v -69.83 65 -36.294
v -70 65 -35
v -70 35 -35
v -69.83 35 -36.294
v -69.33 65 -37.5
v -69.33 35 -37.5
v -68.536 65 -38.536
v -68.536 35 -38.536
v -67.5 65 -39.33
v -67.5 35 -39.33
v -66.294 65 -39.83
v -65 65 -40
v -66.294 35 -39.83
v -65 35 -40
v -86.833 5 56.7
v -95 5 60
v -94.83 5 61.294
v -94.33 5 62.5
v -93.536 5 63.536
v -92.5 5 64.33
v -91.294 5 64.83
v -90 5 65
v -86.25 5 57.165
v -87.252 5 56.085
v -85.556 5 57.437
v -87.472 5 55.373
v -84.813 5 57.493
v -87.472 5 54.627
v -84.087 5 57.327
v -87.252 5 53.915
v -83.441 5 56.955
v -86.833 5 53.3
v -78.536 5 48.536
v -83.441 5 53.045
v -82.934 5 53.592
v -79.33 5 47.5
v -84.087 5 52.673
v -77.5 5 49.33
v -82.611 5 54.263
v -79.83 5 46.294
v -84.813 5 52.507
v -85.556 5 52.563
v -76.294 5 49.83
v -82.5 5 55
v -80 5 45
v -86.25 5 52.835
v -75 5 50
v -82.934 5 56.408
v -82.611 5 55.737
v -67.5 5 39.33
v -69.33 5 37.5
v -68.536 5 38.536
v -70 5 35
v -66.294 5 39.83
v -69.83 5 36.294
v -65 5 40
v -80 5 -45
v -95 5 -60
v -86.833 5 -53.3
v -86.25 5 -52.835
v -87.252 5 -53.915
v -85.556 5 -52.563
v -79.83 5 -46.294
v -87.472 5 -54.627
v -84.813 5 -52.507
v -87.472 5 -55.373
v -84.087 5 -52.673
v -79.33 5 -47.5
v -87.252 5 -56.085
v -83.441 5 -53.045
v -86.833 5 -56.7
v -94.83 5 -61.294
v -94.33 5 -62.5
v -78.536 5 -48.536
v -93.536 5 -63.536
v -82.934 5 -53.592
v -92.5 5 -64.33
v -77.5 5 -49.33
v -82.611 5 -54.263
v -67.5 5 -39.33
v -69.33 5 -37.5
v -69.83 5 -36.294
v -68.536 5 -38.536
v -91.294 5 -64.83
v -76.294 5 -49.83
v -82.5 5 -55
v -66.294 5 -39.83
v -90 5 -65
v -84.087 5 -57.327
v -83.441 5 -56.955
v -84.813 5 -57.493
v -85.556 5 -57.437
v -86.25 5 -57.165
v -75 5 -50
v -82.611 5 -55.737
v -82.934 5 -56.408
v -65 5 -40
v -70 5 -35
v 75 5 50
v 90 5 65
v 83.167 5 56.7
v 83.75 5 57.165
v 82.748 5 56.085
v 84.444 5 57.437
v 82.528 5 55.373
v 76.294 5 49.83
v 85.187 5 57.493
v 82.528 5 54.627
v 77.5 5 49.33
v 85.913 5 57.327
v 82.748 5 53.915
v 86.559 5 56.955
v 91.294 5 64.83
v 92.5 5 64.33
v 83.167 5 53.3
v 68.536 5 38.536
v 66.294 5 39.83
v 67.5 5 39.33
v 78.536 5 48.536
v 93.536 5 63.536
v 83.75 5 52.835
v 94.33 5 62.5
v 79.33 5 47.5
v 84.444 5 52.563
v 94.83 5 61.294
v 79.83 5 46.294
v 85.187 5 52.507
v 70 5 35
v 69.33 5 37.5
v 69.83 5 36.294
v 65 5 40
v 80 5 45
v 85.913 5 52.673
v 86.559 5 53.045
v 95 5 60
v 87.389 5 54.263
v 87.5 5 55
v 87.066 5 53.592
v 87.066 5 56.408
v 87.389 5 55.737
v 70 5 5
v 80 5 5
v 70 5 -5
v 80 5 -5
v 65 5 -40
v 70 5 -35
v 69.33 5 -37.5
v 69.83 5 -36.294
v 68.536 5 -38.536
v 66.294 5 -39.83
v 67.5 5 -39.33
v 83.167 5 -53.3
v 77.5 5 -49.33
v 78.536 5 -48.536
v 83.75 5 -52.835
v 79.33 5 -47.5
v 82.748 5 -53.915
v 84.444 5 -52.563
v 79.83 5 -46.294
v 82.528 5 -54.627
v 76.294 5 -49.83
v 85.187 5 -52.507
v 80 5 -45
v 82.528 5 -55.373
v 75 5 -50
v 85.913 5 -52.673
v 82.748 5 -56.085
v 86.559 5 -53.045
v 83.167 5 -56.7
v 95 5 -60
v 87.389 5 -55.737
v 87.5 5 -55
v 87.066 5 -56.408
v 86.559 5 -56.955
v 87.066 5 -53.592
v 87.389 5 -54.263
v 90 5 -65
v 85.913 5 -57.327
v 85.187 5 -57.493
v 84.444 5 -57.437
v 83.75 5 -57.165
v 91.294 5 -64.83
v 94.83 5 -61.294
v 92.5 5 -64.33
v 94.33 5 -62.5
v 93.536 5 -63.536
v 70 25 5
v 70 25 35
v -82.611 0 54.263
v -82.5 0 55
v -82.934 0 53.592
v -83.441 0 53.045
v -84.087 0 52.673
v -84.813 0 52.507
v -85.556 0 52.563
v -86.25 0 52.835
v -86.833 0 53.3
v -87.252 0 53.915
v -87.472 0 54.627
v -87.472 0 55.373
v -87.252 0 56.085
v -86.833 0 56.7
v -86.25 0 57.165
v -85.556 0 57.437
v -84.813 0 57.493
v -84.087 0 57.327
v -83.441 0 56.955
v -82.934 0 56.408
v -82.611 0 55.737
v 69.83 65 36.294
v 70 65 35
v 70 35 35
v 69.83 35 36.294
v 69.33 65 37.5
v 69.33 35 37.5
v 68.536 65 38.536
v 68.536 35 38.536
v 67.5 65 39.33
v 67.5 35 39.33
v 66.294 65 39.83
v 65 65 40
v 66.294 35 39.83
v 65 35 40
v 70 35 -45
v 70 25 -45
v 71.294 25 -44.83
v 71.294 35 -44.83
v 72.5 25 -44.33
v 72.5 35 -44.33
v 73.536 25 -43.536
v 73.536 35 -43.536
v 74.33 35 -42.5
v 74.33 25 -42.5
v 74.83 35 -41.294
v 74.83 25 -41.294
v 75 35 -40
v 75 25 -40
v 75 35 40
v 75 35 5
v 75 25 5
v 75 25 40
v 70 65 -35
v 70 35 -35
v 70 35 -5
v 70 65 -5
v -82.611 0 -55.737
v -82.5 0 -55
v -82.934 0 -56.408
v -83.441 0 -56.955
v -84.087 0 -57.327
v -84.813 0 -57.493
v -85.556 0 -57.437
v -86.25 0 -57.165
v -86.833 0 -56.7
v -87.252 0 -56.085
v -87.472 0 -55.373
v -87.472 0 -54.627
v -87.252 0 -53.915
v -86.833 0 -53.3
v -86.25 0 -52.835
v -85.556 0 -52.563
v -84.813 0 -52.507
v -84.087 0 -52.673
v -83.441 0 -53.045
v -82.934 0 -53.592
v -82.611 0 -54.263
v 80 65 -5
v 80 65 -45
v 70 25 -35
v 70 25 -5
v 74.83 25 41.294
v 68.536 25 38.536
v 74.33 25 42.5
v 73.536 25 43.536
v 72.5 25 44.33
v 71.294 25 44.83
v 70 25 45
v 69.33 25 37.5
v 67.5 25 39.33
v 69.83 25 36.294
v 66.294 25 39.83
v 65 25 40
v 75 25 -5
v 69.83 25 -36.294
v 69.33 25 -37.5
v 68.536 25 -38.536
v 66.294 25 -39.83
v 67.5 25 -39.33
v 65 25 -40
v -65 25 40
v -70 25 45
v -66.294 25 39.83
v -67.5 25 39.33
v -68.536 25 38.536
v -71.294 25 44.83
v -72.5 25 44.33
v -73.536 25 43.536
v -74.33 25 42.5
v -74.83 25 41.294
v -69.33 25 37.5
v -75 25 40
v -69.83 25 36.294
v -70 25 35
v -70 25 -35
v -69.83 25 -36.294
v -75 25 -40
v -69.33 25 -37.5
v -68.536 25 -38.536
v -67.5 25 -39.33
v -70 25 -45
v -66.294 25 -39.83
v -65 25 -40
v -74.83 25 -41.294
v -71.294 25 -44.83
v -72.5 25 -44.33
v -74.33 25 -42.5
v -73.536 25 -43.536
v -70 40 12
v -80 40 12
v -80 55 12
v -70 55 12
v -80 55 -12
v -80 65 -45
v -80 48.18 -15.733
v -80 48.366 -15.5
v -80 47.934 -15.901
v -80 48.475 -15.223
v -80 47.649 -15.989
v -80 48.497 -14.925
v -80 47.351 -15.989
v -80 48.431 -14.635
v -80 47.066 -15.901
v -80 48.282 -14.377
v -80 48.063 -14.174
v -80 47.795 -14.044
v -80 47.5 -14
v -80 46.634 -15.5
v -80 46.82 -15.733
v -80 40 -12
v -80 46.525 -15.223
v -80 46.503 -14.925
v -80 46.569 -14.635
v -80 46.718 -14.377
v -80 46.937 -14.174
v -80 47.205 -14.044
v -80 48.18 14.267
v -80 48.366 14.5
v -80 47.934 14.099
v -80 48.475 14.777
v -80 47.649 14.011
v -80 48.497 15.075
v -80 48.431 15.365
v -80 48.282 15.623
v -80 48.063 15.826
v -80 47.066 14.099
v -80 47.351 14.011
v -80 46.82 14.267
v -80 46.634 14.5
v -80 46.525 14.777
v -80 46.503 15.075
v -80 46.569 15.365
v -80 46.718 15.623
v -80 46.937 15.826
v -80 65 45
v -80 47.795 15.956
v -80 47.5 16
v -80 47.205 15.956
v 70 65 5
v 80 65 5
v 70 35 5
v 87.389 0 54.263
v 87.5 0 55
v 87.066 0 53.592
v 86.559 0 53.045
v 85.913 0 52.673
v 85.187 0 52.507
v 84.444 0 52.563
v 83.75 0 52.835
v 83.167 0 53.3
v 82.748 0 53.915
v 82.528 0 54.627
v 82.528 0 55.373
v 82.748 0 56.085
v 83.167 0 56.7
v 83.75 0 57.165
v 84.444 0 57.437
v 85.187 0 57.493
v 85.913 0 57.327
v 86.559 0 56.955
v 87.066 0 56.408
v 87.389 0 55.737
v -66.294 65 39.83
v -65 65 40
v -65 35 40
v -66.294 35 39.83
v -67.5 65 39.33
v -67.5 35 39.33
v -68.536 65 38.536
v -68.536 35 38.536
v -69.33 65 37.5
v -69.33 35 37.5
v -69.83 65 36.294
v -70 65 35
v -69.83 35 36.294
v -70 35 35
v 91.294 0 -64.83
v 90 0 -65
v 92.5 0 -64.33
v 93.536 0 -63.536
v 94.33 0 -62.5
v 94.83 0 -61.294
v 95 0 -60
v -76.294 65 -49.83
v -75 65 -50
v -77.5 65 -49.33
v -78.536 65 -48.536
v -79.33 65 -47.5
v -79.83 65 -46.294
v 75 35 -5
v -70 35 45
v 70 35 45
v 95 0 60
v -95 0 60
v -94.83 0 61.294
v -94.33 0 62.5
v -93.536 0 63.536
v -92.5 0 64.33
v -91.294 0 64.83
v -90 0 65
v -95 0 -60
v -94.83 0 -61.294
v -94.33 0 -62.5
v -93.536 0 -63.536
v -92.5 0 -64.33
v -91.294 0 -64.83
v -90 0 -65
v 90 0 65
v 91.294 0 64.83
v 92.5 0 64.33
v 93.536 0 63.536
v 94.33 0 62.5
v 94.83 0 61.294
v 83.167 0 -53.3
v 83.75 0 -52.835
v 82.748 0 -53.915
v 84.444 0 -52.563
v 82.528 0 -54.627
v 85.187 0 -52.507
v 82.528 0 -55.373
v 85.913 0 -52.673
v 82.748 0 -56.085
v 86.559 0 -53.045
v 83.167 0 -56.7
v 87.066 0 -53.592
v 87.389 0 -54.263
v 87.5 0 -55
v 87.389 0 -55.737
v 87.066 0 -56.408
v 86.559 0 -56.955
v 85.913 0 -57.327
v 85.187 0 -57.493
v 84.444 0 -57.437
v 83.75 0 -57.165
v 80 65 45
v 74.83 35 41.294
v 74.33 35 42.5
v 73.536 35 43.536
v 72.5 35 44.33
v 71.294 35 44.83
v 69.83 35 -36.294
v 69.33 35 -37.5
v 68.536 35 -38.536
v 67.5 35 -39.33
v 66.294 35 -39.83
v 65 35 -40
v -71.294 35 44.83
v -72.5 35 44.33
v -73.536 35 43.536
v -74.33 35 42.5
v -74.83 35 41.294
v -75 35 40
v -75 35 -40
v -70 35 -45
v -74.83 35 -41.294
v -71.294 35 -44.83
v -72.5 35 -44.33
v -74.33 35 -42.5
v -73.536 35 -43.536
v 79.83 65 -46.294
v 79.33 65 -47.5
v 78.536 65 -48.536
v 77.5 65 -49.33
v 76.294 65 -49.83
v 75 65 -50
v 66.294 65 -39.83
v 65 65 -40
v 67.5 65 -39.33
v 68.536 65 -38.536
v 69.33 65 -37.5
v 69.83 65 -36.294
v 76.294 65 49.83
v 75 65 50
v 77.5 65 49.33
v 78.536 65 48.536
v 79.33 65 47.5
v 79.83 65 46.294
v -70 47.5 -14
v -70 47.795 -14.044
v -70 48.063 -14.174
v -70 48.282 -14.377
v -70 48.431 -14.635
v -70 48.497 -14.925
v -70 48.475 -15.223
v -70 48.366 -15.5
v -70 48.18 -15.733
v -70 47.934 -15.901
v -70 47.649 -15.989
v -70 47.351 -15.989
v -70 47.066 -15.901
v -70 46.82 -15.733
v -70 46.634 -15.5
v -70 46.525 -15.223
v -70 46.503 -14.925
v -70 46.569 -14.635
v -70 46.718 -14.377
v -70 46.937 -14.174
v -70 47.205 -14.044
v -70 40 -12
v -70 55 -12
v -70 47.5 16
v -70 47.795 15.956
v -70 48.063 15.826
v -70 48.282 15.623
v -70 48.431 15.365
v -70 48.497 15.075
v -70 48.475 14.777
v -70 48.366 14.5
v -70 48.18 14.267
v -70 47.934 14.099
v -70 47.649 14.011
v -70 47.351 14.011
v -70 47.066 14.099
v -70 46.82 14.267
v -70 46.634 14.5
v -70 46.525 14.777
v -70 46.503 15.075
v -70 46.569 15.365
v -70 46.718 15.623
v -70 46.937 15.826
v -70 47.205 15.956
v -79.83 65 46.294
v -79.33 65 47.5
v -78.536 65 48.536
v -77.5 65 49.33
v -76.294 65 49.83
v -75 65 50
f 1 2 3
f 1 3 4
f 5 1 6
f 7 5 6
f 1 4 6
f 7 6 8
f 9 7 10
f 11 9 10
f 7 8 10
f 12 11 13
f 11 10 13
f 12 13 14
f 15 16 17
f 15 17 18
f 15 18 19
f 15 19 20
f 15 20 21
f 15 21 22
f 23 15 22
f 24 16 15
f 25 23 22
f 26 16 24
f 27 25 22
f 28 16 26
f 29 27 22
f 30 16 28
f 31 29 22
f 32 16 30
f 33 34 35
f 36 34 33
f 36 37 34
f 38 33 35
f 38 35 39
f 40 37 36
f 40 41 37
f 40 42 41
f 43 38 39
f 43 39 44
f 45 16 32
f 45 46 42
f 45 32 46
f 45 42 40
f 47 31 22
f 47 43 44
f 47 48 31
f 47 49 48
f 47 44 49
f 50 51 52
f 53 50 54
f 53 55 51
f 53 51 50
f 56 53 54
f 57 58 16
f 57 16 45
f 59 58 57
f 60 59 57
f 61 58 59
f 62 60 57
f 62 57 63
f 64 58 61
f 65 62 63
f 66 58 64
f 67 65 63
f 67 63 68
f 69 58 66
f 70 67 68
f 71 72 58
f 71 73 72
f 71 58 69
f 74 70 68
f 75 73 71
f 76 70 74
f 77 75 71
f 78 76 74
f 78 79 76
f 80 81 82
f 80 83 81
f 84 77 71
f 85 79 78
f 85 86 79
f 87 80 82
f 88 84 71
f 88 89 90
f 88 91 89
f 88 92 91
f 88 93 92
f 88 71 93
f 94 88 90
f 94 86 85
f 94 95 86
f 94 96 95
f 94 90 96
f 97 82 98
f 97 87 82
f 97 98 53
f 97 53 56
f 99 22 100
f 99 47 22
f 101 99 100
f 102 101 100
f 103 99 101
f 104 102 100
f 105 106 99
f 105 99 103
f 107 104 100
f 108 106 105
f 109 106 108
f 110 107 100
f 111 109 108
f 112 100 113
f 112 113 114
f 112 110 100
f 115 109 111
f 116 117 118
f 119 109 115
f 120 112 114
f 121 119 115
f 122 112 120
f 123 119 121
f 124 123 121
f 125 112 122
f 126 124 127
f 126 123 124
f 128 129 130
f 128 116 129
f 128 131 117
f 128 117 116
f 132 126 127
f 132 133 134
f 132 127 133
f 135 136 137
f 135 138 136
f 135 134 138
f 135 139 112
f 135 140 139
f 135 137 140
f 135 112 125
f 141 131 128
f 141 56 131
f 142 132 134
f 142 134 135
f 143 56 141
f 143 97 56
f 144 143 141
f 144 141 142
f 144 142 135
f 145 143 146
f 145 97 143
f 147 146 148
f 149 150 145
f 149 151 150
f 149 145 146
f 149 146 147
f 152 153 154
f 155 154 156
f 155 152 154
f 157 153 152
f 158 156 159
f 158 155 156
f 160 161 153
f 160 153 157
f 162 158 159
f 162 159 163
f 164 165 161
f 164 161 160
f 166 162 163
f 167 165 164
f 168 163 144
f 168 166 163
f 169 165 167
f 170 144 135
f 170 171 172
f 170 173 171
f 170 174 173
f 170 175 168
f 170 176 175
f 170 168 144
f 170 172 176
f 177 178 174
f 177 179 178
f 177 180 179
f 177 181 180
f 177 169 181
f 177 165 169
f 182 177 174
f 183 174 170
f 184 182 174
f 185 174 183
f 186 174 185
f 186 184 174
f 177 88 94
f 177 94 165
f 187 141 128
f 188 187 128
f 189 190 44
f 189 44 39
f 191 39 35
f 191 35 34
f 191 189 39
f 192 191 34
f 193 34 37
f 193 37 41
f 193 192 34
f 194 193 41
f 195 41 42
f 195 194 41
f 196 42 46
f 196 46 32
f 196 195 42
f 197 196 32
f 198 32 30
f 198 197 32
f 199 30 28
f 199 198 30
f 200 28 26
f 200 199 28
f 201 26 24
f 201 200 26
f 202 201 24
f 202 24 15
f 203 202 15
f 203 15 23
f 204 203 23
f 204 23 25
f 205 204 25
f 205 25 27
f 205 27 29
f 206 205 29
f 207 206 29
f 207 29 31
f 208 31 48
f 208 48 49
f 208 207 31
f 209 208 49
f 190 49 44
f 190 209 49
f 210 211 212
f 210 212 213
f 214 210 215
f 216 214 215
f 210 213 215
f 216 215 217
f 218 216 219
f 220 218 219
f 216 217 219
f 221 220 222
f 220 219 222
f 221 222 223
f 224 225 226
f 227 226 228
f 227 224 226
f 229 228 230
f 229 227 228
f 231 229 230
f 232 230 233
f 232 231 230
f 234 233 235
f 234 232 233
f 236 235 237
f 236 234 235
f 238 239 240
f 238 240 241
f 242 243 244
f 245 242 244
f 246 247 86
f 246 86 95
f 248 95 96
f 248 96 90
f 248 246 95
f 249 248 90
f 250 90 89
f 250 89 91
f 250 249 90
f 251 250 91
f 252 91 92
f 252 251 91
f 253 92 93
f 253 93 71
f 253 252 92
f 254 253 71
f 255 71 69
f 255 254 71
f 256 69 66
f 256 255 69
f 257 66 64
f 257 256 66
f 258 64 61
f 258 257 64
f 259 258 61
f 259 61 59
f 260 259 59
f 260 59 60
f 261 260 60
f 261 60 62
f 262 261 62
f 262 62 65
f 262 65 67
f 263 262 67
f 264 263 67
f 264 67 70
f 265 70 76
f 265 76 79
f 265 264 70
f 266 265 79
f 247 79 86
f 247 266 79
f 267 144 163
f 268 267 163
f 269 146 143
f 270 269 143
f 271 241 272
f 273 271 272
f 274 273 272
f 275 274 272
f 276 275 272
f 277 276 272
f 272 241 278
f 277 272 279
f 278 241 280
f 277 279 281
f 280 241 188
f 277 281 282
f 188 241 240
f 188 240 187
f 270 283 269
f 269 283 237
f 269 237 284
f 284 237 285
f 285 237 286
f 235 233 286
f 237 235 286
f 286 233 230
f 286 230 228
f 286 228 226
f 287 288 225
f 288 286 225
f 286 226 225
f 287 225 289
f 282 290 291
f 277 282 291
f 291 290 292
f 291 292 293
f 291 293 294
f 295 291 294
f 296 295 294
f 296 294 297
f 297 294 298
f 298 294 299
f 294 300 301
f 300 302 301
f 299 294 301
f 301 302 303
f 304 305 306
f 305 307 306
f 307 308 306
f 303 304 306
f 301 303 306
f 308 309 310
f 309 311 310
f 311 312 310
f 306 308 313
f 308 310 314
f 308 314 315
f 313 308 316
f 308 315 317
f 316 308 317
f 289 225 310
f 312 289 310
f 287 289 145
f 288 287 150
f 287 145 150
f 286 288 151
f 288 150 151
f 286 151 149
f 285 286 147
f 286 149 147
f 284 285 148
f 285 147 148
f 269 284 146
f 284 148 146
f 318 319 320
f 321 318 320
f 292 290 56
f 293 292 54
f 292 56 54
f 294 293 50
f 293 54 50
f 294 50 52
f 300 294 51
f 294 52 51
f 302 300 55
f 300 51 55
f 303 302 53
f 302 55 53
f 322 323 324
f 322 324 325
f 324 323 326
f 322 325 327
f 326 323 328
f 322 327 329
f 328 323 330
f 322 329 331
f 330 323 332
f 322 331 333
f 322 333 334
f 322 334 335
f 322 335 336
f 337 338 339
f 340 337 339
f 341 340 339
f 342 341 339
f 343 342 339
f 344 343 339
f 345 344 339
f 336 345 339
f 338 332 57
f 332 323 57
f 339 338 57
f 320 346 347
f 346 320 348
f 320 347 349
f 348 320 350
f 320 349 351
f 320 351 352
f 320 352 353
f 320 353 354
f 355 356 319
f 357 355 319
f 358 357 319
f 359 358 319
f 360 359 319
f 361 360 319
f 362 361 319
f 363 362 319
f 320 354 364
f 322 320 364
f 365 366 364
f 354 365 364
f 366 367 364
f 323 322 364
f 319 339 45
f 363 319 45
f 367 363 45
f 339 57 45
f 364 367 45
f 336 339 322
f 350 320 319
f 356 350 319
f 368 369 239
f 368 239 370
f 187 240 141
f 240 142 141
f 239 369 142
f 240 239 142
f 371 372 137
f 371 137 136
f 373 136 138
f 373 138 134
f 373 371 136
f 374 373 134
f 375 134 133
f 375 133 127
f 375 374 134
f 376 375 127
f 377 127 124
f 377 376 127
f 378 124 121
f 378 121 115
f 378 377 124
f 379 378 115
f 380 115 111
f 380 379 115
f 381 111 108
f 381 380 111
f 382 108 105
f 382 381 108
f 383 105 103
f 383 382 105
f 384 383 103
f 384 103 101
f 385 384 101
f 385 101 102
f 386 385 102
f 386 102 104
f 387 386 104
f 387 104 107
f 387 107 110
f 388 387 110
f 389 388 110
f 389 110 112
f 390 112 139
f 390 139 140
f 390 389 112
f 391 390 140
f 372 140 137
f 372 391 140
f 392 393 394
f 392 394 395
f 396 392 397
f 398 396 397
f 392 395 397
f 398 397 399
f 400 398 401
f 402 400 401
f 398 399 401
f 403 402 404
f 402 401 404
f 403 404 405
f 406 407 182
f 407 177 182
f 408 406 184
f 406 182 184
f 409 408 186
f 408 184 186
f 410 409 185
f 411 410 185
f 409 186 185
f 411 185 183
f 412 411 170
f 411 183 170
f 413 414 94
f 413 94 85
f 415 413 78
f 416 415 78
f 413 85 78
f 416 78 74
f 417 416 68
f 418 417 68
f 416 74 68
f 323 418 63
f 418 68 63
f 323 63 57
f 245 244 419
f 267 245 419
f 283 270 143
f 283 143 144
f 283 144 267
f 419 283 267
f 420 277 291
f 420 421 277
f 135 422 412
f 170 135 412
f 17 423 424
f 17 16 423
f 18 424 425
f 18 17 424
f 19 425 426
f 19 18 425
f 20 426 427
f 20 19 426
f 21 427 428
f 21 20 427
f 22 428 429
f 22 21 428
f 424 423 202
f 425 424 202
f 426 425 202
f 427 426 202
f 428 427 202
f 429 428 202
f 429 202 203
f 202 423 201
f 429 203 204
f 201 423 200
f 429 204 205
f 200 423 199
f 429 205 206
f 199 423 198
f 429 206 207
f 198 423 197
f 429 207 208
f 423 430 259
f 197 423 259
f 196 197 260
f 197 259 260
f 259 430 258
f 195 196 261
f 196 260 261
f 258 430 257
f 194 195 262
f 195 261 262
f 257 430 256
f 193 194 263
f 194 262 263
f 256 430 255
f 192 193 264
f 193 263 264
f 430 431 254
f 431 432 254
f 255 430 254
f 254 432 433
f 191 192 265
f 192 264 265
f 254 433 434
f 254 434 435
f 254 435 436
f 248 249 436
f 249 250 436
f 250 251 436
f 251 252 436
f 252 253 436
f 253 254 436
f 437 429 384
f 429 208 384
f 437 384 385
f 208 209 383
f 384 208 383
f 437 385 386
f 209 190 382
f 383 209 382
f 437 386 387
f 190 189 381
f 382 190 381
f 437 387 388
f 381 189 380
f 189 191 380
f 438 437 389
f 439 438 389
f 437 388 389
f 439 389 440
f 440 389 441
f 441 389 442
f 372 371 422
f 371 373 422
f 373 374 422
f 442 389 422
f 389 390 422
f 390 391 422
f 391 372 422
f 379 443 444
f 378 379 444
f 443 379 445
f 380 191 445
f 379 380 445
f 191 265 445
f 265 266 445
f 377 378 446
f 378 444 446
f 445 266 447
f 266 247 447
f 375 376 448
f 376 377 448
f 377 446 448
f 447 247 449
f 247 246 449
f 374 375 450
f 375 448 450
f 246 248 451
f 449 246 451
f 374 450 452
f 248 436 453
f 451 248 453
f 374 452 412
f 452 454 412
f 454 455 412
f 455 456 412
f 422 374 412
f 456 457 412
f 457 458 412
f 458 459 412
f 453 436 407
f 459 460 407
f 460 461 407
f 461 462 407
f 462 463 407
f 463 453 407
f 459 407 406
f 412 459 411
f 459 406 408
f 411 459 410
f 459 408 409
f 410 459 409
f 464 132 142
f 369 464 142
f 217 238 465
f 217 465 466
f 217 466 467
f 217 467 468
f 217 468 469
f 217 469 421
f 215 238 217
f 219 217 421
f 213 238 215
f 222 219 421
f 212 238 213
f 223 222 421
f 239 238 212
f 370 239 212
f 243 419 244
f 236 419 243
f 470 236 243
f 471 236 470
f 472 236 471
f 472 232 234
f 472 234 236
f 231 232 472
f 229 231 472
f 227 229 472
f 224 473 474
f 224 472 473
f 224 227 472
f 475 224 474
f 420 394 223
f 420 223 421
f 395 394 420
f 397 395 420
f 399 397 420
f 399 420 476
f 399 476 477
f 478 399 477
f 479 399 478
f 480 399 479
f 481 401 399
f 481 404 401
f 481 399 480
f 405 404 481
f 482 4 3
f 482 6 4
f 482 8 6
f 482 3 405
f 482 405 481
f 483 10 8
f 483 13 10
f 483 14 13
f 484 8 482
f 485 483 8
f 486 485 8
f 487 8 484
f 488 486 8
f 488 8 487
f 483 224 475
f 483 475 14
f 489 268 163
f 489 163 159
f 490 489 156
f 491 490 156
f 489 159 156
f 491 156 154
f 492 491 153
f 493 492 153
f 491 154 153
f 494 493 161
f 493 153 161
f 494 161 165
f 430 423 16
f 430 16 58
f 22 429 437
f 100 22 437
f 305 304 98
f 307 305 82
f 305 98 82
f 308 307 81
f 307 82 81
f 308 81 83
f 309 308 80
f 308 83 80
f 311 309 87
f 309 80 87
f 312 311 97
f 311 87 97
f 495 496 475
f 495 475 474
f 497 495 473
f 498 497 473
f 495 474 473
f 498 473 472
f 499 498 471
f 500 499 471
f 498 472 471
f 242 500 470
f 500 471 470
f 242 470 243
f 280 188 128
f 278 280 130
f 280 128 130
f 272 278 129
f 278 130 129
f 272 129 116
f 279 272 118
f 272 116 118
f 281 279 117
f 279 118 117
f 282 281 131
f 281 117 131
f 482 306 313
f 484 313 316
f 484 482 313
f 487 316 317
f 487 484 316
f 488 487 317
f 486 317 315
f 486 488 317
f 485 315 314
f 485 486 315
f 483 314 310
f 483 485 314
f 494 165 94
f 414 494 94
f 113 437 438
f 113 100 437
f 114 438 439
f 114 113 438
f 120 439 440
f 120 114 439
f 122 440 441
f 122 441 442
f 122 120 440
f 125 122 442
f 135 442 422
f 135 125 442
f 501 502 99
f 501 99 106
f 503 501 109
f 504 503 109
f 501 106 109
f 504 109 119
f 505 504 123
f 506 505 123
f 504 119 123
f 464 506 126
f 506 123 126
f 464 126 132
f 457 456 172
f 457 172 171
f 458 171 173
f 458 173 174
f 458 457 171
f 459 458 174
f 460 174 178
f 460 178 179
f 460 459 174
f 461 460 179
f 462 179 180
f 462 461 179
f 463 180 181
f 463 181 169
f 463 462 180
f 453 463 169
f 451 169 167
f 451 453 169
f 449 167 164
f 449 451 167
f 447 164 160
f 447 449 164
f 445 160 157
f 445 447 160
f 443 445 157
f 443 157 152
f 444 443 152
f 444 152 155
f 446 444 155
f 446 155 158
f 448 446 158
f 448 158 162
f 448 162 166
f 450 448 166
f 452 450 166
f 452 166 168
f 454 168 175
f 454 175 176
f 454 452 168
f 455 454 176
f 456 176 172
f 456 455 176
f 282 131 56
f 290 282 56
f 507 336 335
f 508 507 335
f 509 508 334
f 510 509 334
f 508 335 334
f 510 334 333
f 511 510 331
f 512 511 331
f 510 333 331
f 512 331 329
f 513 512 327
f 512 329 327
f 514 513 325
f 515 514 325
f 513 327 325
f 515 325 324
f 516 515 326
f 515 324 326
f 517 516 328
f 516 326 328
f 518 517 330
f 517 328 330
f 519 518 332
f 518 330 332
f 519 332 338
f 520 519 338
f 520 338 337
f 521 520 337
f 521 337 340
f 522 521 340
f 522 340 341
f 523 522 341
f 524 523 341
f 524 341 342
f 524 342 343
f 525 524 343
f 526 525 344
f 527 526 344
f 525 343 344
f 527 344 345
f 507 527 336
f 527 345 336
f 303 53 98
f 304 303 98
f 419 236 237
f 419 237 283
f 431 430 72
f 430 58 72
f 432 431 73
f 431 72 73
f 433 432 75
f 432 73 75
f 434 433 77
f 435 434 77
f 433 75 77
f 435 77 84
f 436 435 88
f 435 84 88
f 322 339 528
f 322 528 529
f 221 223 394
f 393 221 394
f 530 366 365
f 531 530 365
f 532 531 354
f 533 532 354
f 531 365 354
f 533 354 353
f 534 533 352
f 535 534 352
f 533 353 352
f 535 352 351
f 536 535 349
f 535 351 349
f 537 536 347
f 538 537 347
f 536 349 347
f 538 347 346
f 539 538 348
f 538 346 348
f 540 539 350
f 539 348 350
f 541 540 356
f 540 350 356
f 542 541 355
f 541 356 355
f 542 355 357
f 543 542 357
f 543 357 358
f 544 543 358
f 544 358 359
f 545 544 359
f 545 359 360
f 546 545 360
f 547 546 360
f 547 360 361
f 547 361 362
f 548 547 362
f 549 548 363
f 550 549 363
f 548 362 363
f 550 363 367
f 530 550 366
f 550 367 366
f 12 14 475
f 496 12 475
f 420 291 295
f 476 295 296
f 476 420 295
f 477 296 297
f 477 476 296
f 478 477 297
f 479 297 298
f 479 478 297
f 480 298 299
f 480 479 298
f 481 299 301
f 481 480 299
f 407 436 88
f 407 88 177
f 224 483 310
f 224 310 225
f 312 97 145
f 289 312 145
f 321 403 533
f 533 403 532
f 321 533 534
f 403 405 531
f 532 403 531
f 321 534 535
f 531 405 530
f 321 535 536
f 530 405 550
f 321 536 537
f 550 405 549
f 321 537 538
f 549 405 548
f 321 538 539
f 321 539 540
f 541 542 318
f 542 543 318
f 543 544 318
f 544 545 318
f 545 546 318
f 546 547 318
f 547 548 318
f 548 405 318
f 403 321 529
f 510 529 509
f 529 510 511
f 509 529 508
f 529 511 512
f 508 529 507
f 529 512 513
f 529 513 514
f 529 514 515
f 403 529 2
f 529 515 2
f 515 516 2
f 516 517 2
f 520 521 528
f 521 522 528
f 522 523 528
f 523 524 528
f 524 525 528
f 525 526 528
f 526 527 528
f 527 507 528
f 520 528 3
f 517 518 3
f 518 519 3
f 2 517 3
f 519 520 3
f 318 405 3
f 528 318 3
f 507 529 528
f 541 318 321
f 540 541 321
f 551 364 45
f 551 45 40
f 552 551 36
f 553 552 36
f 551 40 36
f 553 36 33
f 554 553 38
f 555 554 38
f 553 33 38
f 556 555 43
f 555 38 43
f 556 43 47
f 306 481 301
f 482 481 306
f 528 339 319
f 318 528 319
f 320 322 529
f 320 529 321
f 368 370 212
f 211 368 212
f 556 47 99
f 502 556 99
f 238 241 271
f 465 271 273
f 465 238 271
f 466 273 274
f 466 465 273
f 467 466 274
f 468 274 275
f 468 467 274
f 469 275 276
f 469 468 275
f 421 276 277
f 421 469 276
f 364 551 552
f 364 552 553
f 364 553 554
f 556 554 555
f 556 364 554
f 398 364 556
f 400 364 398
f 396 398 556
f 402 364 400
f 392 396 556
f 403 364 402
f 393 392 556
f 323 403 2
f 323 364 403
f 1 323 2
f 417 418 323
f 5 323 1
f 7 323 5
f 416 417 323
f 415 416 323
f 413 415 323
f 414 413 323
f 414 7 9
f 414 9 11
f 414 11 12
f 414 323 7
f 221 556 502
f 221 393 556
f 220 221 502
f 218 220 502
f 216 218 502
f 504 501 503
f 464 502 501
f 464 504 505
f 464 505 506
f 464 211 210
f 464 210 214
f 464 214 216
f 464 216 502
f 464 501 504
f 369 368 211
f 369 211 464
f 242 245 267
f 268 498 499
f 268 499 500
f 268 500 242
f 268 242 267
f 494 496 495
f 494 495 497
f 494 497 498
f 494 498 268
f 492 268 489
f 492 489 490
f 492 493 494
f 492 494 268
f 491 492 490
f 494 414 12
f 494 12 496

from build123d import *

# Parameters (mm, degrees)
SKETCH_1_W          = 190
SKETCH_1_H          = 130
SKETCH_1_R          = 2.5
EXTRUDE_1_DEPTH     = 5
FILLET_1_R          = 5
EXTRUDE_2_DEPTH     = 60
SKETCH_3_R          = 1
SKETCH_3_W          = 24
SKETCH_3_H          = 15
CUT_EXTRUDE_1_DEPTH = 10
CUT_EXTRUDE_2_DEPTH = 5


with BuildPart() as part:
    # 草圖1 → 填料-伸長1 (new body)
    with BuildSketch(Plane(origin=(0, 0, 0), x_dir=(1, 0, 0), z_dir=(0, 1, 0))):
        Rectangle(SKETCH_1_W, SKETCH_1_H)
        with Locations((-85, 55)):
            Circle(SKETCH_1_R, mode=Mode.SUBTRACT)
        with Locations((85, 55)):
            Circle(SKETCH_1_R, mode=Mode.SUBTRACT)
        with Locations((-85, -55)):
            Circle(SKETCH_1_R, mode=Mode.SUBTRACT)
        with Locations((85, -55)):
            Circle(SKETCH_1_R, mode=Mode.SUBTRACT)
    extrude(amount=EXTRUDE_1_DEPTH)

    # 圓角1
    fillet_1_edges = [part.edges().sort_by_distance(p)[0] for p in [
        (95, 2.5, 65),
        (-95, 2.5, 65),
        (-95, 2.5, -65),
        (95, 2.5, -65),
    ]]
    fillet(fillet_1_edges, radius=FILLET_1_R)

    # 草圖2 → 填料-伸長2 (add)
    with BuildSketch(Plane(origin=(0, 5, 0), x_dir=(1, 0, 0), z_dir=(0, 1, 0))):
        with BuildLine():
            Line((-80, 45), (-80, -45))
            ThreePointArc((-80, -45), (-78.535533906, -48.535533906), (-75, -50))
            Line((-75, -50), (75, -50))
            ThreePointArc((75, -50), (78.535533906, -48.535533906), (80, -45))
            Line((80, -45), (80, -5))
            Line((80, -5), (70, -5))
            Line((70, -5), (70, -35))
            ThreePointArc((70, -35), (68.535533906, -38.535533906), (65, -40))
            Line((65, -40), (-65, -40))
            ThreePointArc((-65, -40), (-68.535533906, -38.535533906), (-70, -35))
            Line((-70, -35), (-70, 35))
            ThreePointArc((-70, 35), (-68.535533906, 38.535533906), (-65, 40))
            Line((-65, 40), (65, 40))
            ThreePointArc((65, 40), (68.535533906, 38.535533906), (70, 35))
            Line((70, 35), (70, 5))
            Line((70, 5), (80, 5))
            Line((80, 5), (80, 45))
            ThreePointArc((80, 45), (78.535533906, 48.535533906), (75, 50))
            Line((75, 50), (-75, 50))
            ThreePointArc((-75, 50), (-78.535533906, 48.535533906), (-80, 45))
        make_face()
    extrude(amount=EXTRUDE_2_DEPTH)

    # 草圖3 → 除料-伸長1 (cut)
    with BuildSketch(Plane.ZY.offset(80)):
        with Locations((15, 47.5)):
            Circle(SKETCH_3_R)
        with Locations((-15, 47.5)):
            Circle(SKETCH_3_R)
        with Locations((0, 47.5)):
            Rectangle(SKETCH_3_W, SKETCH_3_H)
    extrude(amount=-CUT_EXTRUDE_1_DEPTH, mode=Mode.SUBTRACT)

    # 草圖4 → 除料-伸長2 (cut, symmetric)
    with BuildSketch(Plane(origin=(0, 30, 0), x_dir=(1, 0, 0), z_dir=(0, 1, 0))):
        with BuildLine():
            Line((-70, 45), (70, 45))
            ThreePointArc((70, 45), (73.535533906, 43.535533906), (75, 40))
            Line((75, 40), (75, -40))
            ThreePointArc((75, -40), (73.535533906, -43.535533906), (70, -45))
            Line((70, -45), (-70, -45))
            ThreePointArc((-70, -45), (-73.535533906, -43.535533906), (-75, -40))
            Line((-75, -40), (-75, 40))
            ThreePointArc((-75, 40), (-73.535533906, 43.535533906), (-70, 45))
        make_face()
        with BuildLine():
            Line((-65, 40), (65, 40))
            ThreePointArc((65, 40), (68.535533906, 38.535533906), (70, 35))
            Line((70, 35), (70, -35))
            ThreePointArc((70, -35), (68.535533906, -38.535533906), (65, -40))
            Line((65, -40), (-65, -40))
            ThreePointArc((-65, -40), (-68.535533906, -38.535533906), (-70, -35))
            Line((-70, -35), (-70, 35))
            ThreePointArc((-70, 35), (-68.535533906, 38.535533906), (-65, 40))
        make_face(mode=Mode.SUBTRACT)
    extrude(amount=CUT_EXTRUDE_2_DEPTH, both=True, mode=Mode.SUBTRACT)


solid = part.part
